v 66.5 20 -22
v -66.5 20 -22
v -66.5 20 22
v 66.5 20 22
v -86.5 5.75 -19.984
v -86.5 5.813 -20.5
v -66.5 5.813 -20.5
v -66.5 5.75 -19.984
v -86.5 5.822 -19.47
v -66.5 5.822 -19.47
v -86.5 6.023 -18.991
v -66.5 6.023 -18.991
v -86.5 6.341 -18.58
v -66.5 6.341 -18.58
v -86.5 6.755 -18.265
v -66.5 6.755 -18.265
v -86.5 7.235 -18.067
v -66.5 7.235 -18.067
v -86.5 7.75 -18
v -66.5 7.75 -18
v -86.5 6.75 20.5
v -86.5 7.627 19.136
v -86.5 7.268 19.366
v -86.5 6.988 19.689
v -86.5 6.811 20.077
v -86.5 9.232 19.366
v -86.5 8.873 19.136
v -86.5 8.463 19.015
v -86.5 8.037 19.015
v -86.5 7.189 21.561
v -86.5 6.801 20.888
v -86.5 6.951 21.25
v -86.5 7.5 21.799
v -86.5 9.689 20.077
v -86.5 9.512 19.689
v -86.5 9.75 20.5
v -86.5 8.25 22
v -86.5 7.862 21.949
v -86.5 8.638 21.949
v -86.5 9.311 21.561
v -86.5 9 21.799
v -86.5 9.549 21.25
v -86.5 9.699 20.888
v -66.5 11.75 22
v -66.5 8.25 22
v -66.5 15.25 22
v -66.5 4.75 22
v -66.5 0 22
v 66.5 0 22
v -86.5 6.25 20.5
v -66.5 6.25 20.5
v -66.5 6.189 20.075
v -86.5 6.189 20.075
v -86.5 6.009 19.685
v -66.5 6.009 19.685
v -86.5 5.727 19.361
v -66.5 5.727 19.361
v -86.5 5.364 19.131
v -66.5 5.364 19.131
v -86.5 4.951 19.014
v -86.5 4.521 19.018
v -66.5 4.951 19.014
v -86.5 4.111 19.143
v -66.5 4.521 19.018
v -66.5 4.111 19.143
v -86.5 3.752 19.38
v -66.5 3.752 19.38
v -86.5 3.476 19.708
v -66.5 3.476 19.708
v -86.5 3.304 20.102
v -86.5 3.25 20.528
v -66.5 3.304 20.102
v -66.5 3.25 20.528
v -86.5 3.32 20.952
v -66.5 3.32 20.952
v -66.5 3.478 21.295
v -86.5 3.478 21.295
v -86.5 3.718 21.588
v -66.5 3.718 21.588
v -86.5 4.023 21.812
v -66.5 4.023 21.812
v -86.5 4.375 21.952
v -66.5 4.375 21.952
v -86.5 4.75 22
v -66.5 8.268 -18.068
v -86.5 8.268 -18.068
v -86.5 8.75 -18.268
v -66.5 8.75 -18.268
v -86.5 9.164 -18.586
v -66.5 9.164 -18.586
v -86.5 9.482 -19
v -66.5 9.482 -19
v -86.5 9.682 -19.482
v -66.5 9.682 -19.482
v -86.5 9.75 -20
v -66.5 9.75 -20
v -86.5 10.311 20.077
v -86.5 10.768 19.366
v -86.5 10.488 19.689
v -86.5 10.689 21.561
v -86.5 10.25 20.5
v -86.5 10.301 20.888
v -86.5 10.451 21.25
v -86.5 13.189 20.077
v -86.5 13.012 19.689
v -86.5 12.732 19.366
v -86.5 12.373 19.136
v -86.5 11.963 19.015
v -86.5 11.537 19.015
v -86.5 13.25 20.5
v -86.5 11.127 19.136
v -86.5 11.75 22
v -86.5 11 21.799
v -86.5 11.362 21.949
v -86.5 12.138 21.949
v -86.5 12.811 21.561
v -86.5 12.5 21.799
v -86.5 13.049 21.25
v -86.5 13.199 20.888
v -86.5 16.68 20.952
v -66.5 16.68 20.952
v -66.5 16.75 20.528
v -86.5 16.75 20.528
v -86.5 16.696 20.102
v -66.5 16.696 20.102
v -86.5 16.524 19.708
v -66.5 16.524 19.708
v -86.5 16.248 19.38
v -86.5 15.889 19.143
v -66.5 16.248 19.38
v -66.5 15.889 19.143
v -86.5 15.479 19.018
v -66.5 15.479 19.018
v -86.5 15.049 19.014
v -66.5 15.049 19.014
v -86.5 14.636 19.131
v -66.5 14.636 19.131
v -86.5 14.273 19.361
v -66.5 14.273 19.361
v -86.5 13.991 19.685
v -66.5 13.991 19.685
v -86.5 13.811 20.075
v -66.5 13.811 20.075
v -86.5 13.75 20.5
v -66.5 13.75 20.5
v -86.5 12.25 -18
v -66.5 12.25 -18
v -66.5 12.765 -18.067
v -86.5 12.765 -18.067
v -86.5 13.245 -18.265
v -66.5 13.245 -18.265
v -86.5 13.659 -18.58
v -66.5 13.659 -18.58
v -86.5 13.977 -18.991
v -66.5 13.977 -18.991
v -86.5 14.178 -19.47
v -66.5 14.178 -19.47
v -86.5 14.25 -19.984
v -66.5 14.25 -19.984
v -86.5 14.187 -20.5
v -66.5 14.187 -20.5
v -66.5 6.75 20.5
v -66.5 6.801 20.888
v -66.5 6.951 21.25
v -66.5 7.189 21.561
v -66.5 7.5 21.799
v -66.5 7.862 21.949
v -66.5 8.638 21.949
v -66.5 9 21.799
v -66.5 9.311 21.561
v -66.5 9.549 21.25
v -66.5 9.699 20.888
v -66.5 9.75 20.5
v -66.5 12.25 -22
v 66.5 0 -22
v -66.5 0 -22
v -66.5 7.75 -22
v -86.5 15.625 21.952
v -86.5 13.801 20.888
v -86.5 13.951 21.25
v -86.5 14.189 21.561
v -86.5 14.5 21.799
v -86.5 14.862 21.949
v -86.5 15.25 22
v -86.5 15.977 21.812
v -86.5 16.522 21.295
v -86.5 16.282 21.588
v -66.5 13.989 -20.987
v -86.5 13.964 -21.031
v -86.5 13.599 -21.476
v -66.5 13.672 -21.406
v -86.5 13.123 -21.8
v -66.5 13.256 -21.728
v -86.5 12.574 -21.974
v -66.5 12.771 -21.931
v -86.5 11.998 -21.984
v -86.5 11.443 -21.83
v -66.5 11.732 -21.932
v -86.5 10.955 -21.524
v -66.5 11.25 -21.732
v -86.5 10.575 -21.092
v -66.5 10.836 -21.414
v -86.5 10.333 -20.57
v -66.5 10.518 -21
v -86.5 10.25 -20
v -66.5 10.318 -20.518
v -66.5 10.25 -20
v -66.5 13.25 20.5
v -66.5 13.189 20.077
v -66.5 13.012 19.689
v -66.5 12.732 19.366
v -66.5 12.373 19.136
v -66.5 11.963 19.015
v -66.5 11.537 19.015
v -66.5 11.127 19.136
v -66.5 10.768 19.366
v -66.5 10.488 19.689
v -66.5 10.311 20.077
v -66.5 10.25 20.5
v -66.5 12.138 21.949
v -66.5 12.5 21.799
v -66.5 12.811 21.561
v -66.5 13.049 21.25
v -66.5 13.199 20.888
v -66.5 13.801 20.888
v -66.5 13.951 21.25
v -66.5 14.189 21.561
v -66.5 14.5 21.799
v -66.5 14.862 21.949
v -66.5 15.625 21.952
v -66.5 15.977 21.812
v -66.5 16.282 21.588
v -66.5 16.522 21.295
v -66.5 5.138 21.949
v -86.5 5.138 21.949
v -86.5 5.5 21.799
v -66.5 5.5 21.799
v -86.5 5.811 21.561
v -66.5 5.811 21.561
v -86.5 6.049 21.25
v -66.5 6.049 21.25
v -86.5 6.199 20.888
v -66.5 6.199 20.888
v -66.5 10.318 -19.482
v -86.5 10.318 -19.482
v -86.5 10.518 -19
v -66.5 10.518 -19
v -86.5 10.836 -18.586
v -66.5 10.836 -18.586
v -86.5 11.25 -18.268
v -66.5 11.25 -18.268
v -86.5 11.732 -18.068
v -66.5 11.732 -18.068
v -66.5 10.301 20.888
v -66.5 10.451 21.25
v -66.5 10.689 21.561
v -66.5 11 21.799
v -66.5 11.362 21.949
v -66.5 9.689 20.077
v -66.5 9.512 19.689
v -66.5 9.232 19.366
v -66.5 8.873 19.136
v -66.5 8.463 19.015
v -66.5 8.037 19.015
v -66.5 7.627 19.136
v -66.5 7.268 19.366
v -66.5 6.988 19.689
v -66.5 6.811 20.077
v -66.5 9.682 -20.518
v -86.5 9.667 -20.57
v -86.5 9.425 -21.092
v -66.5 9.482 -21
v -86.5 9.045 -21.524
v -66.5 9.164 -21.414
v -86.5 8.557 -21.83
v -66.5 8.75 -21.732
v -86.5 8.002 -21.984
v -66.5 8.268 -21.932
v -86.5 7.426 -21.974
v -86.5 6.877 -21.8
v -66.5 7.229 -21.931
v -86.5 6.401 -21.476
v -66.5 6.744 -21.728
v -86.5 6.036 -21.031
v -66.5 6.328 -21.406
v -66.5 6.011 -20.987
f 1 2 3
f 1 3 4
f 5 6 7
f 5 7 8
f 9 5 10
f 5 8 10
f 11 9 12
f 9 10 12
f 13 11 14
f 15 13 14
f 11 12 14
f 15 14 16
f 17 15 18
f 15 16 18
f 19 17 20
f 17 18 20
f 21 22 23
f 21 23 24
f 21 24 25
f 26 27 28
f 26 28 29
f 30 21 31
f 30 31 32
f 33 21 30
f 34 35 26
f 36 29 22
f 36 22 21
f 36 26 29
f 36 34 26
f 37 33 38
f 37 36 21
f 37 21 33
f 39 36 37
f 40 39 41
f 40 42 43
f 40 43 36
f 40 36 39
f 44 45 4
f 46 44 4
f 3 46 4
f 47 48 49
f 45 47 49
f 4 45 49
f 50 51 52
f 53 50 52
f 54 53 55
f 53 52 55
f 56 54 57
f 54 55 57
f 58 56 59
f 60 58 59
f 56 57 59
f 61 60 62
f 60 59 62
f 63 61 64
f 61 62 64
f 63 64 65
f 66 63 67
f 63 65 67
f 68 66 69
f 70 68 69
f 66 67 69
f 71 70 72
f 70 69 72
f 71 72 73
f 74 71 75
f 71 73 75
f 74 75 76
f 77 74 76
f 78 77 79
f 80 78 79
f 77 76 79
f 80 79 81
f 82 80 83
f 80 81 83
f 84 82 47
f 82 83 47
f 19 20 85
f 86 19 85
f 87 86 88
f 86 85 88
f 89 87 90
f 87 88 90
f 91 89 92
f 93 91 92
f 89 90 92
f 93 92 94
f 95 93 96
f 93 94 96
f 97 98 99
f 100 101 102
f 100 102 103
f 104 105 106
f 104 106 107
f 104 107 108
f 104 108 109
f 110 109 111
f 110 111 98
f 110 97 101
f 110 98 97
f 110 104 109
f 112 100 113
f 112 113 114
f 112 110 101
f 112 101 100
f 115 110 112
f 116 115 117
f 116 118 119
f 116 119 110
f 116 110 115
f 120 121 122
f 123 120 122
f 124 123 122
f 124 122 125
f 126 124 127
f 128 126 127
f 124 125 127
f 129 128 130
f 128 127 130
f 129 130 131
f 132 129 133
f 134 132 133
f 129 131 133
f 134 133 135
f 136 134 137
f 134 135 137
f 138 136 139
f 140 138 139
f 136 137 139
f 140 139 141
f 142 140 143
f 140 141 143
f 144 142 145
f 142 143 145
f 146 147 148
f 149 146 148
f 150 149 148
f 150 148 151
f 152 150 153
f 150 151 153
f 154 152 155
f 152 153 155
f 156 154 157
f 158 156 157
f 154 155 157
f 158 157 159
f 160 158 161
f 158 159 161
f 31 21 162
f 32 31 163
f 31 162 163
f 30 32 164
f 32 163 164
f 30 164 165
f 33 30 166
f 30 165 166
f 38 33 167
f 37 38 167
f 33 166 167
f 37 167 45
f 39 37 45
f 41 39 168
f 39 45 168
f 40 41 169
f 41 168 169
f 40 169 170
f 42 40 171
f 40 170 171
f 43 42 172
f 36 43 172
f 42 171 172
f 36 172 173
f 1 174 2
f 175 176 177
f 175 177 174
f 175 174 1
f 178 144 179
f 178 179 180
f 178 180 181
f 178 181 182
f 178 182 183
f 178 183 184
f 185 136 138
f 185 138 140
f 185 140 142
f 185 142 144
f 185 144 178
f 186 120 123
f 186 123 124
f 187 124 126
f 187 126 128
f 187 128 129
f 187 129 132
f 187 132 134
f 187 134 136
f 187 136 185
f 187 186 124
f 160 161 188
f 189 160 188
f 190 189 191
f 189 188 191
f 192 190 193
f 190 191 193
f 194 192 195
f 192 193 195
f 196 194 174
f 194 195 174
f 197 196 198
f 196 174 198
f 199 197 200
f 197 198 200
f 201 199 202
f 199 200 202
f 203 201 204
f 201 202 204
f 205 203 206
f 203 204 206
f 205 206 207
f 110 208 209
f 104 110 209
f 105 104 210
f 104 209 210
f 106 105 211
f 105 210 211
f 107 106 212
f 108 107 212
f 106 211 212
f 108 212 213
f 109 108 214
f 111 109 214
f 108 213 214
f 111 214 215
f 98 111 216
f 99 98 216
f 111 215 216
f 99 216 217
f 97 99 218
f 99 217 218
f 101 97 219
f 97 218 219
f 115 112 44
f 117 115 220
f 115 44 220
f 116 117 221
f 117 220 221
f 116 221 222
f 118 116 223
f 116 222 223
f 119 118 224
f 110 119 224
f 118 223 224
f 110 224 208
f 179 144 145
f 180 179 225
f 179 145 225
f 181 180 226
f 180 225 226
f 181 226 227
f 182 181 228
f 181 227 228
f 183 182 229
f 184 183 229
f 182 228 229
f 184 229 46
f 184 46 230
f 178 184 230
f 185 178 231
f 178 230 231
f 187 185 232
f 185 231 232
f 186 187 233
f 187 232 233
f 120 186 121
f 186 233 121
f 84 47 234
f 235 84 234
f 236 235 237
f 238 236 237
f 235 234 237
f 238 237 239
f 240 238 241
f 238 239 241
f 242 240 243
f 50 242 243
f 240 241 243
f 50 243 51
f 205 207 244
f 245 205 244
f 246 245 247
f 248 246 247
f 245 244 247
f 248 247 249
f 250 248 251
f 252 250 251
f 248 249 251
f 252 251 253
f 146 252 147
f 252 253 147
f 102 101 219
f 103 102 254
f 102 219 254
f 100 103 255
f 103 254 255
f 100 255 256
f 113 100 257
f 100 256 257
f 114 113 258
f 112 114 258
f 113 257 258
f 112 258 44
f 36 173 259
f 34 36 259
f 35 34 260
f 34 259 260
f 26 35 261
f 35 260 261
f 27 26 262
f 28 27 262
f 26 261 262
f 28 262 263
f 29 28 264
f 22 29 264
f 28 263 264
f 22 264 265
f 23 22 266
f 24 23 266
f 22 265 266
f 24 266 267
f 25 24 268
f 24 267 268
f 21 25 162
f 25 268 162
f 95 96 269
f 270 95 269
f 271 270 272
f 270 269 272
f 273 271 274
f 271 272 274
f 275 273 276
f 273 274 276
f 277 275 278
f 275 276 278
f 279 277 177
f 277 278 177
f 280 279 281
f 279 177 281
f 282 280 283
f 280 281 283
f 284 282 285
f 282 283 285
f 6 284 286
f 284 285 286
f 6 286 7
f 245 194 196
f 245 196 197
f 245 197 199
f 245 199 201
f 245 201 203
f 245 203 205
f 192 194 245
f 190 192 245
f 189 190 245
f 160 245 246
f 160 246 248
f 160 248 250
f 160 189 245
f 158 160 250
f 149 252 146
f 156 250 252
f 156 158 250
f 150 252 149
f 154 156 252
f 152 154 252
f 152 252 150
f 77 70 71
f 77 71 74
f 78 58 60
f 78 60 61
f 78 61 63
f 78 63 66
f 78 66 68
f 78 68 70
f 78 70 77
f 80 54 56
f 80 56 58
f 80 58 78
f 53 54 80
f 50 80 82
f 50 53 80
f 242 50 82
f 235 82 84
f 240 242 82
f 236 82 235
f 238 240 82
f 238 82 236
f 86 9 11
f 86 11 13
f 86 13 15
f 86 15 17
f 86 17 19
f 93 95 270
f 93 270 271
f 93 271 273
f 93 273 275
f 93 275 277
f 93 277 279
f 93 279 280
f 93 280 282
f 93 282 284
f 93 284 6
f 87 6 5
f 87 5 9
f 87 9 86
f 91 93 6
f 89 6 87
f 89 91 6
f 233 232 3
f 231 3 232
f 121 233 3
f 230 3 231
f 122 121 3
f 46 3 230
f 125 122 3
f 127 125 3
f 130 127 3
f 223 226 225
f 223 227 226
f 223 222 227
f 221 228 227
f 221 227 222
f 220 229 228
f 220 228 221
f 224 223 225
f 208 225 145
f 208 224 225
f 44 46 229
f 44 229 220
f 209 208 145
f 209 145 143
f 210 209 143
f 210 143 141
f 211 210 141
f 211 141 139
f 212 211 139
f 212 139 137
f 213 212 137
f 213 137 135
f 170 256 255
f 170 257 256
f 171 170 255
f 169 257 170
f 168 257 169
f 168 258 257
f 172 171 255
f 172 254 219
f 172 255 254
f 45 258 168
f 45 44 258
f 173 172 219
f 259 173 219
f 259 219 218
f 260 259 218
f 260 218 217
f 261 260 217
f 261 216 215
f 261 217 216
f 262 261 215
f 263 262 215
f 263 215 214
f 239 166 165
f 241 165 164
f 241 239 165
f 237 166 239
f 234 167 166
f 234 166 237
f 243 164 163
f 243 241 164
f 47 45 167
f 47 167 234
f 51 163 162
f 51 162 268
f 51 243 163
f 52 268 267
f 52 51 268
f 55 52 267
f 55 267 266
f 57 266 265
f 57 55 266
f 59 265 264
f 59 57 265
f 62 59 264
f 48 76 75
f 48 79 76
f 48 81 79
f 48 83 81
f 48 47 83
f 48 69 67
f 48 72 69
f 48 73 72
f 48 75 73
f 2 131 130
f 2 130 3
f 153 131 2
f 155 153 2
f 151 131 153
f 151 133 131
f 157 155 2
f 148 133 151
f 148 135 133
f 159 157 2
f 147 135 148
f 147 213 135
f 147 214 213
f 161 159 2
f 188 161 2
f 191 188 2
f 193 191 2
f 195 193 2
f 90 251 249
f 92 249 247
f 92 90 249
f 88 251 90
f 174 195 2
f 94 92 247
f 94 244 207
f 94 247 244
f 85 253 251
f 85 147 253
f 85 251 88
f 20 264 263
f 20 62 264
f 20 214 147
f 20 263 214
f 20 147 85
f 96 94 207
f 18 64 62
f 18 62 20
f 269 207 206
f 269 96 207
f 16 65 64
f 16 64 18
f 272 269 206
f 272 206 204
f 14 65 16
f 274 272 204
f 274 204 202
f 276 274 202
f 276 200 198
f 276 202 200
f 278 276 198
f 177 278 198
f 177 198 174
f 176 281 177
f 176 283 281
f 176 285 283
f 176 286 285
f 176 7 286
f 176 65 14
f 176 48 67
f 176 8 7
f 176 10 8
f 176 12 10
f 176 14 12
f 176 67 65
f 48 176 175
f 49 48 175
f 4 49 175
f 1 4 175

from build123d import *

# Parameters (mm, degrees)
SKETCH1_W           = 133
SKETCH1_H           = 44
BOSS_EXTRUDE1_DEPTH = 20
BOSS_EXTRUDE3_DEPTH = 20


with BuildPart() as part:
    # Sketch1 → Boss-Extrude1 (new body)
    with BuildSketch(Plane(origin=(0, 0, 0), x_dir=(1, 0, 0), z_dir=(0, 1, 0))):
        Rectangle(SKETCH1_W, SKETCH1_H)
    extrude(amount=BOSS_EXTRUDE1_DEPTH)

    # Sketch2 → Boss-Extrude3 (add)
    with BuildSketch(Plane.ZY.offset(66.5)):
        with BuildLine():
            ThreePointArc((-18, 12.25), (-18.775155536, 13.831061681), (-20.499756038, 14.186554647))
            Line((-20.499756038, 14.186554647), (-20, 12.25))
            Line((-20, 12.25), (-20, 10.25))
            ThreePointArc((-20, 10.25), (-18.585786438, 10.835786438), (-18, 12.25))
        make_face()
        with BuildLine():
            Line((-20, 12.25), (-20.499756038, 14.186554647))
            ThreePointArc((-20.499756038, 14.186554647), (-21.984075263, 11.998116391), (-20, 10.25))
            Line((-20, 10.25), (-20, 12.25))
        make_face()
        with BuildLine():
            ThreePointArc((-18, 7.75), (-18.585786438, 9.164213562), (-20, 9.75))
            Line((-20, 9.75), (-20, 7.75))
            Line((-20, 7.75), (-20.499756038, 5.813445353))
            ThreePointArc((-20.499756038, 5.813445353), (-18.775155536, 6.168938319), (-18, 7.75))
        make_face()
        with BuildLine():
            Line((-20, 7.75), (-20, 9.75))
            ThreePointArc((-20, 9.75), (-21.984075263, 8.001883609), (-20.499756038, 5.813445353))
            Line((-20.499756038, 5.813445353), (-20, 7.75))
        make_face()
        with BuildLine():
            ThreePointArc((22, 15.25), (21.709864781, 16.136694542), (20.951697052, 16.680373998))
            Line((20.951697052, 16.680373998), (20.5, 15.25))
            Line((20.5, 15.25), (20.5, 13.75))
            ThreePointArc((20.5, 13.75), (21.560660172, 14.189339828), (22, 15.25))
        make_face()
        with BuildLine():
            Line((20.5, 15.25), (20.951697052, 16.680373998))
            ThreePointArc((20.951697052, 16.680373998), (19.017508685, 15.478515868), (20.5, 13.75))
            Line((20.5, 13.75), (20.5, 15.25))
        make_face()
        with BuildLine():
            ThreePointArc((22, 11.75), (21.560660172, 12.810660172), (20.5, 13.25))
            Line((20.5, 13.25), (20.5, 11.75))
            Line((20.5, 11.75), (20.5, 10.25))
            ThreePointArc((20.5, 10.25), (21.560660172, 10.689339828), (22, 11.75))
        make_face()
        with BuildLine():
            Line((20.5, 11.75), (20.5, 13.25))
            ThreePointArc((20.5, 13.25), (19, 11.75), (20.5, 10.25))
            Line((20.5, 10.25), (20.5, 11.75))
        make_face()
        with BuildLine():
            ThreePointArc((22, 8.25), (21.560660172, 9.310660172), (20.5, 9.75))
            Line((20.5, 9.75), (20.5, 8.25))
            Line((20.5, 8.25), (20.5, 6.75))
            ThreePointArc((20.5, 6.75), (21.560660172, 7.189339828), (22, 8.25))
        make_face()
        with BuildLine():
            Line((20.5, 8.25), (20.5, 9.75))
            ThreePointArc((20.5, 9.75), (19, 8.25), (20.5, 6.75))
            Line((20.5, 6.75), (20.5, 8.25))
        make_face()
        with BuildLine():
            ThreePointArc((22, 4.75), (21.560660172, 5.810660172), (20.5, 6.25))
            Line((20.5, 6.25), (20.5, 4.75))
            Line((20.5, 4.75), (20.951697052, 3.319626002))
            ThreePointArc((20.951697052, 3.319626002), (21.709864781, 3.863305458), (22, 4.75))
        make_face()
        with BuildLine():
            Line((20.5, 4.75), (20.5, 6.25))
            ThreePointArc((20.5, 6.25), (19.017508685, 4.521484132), (20.951697052, 3.319626002))
            Line((20.951697052, 3.319626002), (20.5, 4.75))
        make_face()
    extrude(amount=BOSS_EXTRUDE3_DEPTH)


solid = part.part
